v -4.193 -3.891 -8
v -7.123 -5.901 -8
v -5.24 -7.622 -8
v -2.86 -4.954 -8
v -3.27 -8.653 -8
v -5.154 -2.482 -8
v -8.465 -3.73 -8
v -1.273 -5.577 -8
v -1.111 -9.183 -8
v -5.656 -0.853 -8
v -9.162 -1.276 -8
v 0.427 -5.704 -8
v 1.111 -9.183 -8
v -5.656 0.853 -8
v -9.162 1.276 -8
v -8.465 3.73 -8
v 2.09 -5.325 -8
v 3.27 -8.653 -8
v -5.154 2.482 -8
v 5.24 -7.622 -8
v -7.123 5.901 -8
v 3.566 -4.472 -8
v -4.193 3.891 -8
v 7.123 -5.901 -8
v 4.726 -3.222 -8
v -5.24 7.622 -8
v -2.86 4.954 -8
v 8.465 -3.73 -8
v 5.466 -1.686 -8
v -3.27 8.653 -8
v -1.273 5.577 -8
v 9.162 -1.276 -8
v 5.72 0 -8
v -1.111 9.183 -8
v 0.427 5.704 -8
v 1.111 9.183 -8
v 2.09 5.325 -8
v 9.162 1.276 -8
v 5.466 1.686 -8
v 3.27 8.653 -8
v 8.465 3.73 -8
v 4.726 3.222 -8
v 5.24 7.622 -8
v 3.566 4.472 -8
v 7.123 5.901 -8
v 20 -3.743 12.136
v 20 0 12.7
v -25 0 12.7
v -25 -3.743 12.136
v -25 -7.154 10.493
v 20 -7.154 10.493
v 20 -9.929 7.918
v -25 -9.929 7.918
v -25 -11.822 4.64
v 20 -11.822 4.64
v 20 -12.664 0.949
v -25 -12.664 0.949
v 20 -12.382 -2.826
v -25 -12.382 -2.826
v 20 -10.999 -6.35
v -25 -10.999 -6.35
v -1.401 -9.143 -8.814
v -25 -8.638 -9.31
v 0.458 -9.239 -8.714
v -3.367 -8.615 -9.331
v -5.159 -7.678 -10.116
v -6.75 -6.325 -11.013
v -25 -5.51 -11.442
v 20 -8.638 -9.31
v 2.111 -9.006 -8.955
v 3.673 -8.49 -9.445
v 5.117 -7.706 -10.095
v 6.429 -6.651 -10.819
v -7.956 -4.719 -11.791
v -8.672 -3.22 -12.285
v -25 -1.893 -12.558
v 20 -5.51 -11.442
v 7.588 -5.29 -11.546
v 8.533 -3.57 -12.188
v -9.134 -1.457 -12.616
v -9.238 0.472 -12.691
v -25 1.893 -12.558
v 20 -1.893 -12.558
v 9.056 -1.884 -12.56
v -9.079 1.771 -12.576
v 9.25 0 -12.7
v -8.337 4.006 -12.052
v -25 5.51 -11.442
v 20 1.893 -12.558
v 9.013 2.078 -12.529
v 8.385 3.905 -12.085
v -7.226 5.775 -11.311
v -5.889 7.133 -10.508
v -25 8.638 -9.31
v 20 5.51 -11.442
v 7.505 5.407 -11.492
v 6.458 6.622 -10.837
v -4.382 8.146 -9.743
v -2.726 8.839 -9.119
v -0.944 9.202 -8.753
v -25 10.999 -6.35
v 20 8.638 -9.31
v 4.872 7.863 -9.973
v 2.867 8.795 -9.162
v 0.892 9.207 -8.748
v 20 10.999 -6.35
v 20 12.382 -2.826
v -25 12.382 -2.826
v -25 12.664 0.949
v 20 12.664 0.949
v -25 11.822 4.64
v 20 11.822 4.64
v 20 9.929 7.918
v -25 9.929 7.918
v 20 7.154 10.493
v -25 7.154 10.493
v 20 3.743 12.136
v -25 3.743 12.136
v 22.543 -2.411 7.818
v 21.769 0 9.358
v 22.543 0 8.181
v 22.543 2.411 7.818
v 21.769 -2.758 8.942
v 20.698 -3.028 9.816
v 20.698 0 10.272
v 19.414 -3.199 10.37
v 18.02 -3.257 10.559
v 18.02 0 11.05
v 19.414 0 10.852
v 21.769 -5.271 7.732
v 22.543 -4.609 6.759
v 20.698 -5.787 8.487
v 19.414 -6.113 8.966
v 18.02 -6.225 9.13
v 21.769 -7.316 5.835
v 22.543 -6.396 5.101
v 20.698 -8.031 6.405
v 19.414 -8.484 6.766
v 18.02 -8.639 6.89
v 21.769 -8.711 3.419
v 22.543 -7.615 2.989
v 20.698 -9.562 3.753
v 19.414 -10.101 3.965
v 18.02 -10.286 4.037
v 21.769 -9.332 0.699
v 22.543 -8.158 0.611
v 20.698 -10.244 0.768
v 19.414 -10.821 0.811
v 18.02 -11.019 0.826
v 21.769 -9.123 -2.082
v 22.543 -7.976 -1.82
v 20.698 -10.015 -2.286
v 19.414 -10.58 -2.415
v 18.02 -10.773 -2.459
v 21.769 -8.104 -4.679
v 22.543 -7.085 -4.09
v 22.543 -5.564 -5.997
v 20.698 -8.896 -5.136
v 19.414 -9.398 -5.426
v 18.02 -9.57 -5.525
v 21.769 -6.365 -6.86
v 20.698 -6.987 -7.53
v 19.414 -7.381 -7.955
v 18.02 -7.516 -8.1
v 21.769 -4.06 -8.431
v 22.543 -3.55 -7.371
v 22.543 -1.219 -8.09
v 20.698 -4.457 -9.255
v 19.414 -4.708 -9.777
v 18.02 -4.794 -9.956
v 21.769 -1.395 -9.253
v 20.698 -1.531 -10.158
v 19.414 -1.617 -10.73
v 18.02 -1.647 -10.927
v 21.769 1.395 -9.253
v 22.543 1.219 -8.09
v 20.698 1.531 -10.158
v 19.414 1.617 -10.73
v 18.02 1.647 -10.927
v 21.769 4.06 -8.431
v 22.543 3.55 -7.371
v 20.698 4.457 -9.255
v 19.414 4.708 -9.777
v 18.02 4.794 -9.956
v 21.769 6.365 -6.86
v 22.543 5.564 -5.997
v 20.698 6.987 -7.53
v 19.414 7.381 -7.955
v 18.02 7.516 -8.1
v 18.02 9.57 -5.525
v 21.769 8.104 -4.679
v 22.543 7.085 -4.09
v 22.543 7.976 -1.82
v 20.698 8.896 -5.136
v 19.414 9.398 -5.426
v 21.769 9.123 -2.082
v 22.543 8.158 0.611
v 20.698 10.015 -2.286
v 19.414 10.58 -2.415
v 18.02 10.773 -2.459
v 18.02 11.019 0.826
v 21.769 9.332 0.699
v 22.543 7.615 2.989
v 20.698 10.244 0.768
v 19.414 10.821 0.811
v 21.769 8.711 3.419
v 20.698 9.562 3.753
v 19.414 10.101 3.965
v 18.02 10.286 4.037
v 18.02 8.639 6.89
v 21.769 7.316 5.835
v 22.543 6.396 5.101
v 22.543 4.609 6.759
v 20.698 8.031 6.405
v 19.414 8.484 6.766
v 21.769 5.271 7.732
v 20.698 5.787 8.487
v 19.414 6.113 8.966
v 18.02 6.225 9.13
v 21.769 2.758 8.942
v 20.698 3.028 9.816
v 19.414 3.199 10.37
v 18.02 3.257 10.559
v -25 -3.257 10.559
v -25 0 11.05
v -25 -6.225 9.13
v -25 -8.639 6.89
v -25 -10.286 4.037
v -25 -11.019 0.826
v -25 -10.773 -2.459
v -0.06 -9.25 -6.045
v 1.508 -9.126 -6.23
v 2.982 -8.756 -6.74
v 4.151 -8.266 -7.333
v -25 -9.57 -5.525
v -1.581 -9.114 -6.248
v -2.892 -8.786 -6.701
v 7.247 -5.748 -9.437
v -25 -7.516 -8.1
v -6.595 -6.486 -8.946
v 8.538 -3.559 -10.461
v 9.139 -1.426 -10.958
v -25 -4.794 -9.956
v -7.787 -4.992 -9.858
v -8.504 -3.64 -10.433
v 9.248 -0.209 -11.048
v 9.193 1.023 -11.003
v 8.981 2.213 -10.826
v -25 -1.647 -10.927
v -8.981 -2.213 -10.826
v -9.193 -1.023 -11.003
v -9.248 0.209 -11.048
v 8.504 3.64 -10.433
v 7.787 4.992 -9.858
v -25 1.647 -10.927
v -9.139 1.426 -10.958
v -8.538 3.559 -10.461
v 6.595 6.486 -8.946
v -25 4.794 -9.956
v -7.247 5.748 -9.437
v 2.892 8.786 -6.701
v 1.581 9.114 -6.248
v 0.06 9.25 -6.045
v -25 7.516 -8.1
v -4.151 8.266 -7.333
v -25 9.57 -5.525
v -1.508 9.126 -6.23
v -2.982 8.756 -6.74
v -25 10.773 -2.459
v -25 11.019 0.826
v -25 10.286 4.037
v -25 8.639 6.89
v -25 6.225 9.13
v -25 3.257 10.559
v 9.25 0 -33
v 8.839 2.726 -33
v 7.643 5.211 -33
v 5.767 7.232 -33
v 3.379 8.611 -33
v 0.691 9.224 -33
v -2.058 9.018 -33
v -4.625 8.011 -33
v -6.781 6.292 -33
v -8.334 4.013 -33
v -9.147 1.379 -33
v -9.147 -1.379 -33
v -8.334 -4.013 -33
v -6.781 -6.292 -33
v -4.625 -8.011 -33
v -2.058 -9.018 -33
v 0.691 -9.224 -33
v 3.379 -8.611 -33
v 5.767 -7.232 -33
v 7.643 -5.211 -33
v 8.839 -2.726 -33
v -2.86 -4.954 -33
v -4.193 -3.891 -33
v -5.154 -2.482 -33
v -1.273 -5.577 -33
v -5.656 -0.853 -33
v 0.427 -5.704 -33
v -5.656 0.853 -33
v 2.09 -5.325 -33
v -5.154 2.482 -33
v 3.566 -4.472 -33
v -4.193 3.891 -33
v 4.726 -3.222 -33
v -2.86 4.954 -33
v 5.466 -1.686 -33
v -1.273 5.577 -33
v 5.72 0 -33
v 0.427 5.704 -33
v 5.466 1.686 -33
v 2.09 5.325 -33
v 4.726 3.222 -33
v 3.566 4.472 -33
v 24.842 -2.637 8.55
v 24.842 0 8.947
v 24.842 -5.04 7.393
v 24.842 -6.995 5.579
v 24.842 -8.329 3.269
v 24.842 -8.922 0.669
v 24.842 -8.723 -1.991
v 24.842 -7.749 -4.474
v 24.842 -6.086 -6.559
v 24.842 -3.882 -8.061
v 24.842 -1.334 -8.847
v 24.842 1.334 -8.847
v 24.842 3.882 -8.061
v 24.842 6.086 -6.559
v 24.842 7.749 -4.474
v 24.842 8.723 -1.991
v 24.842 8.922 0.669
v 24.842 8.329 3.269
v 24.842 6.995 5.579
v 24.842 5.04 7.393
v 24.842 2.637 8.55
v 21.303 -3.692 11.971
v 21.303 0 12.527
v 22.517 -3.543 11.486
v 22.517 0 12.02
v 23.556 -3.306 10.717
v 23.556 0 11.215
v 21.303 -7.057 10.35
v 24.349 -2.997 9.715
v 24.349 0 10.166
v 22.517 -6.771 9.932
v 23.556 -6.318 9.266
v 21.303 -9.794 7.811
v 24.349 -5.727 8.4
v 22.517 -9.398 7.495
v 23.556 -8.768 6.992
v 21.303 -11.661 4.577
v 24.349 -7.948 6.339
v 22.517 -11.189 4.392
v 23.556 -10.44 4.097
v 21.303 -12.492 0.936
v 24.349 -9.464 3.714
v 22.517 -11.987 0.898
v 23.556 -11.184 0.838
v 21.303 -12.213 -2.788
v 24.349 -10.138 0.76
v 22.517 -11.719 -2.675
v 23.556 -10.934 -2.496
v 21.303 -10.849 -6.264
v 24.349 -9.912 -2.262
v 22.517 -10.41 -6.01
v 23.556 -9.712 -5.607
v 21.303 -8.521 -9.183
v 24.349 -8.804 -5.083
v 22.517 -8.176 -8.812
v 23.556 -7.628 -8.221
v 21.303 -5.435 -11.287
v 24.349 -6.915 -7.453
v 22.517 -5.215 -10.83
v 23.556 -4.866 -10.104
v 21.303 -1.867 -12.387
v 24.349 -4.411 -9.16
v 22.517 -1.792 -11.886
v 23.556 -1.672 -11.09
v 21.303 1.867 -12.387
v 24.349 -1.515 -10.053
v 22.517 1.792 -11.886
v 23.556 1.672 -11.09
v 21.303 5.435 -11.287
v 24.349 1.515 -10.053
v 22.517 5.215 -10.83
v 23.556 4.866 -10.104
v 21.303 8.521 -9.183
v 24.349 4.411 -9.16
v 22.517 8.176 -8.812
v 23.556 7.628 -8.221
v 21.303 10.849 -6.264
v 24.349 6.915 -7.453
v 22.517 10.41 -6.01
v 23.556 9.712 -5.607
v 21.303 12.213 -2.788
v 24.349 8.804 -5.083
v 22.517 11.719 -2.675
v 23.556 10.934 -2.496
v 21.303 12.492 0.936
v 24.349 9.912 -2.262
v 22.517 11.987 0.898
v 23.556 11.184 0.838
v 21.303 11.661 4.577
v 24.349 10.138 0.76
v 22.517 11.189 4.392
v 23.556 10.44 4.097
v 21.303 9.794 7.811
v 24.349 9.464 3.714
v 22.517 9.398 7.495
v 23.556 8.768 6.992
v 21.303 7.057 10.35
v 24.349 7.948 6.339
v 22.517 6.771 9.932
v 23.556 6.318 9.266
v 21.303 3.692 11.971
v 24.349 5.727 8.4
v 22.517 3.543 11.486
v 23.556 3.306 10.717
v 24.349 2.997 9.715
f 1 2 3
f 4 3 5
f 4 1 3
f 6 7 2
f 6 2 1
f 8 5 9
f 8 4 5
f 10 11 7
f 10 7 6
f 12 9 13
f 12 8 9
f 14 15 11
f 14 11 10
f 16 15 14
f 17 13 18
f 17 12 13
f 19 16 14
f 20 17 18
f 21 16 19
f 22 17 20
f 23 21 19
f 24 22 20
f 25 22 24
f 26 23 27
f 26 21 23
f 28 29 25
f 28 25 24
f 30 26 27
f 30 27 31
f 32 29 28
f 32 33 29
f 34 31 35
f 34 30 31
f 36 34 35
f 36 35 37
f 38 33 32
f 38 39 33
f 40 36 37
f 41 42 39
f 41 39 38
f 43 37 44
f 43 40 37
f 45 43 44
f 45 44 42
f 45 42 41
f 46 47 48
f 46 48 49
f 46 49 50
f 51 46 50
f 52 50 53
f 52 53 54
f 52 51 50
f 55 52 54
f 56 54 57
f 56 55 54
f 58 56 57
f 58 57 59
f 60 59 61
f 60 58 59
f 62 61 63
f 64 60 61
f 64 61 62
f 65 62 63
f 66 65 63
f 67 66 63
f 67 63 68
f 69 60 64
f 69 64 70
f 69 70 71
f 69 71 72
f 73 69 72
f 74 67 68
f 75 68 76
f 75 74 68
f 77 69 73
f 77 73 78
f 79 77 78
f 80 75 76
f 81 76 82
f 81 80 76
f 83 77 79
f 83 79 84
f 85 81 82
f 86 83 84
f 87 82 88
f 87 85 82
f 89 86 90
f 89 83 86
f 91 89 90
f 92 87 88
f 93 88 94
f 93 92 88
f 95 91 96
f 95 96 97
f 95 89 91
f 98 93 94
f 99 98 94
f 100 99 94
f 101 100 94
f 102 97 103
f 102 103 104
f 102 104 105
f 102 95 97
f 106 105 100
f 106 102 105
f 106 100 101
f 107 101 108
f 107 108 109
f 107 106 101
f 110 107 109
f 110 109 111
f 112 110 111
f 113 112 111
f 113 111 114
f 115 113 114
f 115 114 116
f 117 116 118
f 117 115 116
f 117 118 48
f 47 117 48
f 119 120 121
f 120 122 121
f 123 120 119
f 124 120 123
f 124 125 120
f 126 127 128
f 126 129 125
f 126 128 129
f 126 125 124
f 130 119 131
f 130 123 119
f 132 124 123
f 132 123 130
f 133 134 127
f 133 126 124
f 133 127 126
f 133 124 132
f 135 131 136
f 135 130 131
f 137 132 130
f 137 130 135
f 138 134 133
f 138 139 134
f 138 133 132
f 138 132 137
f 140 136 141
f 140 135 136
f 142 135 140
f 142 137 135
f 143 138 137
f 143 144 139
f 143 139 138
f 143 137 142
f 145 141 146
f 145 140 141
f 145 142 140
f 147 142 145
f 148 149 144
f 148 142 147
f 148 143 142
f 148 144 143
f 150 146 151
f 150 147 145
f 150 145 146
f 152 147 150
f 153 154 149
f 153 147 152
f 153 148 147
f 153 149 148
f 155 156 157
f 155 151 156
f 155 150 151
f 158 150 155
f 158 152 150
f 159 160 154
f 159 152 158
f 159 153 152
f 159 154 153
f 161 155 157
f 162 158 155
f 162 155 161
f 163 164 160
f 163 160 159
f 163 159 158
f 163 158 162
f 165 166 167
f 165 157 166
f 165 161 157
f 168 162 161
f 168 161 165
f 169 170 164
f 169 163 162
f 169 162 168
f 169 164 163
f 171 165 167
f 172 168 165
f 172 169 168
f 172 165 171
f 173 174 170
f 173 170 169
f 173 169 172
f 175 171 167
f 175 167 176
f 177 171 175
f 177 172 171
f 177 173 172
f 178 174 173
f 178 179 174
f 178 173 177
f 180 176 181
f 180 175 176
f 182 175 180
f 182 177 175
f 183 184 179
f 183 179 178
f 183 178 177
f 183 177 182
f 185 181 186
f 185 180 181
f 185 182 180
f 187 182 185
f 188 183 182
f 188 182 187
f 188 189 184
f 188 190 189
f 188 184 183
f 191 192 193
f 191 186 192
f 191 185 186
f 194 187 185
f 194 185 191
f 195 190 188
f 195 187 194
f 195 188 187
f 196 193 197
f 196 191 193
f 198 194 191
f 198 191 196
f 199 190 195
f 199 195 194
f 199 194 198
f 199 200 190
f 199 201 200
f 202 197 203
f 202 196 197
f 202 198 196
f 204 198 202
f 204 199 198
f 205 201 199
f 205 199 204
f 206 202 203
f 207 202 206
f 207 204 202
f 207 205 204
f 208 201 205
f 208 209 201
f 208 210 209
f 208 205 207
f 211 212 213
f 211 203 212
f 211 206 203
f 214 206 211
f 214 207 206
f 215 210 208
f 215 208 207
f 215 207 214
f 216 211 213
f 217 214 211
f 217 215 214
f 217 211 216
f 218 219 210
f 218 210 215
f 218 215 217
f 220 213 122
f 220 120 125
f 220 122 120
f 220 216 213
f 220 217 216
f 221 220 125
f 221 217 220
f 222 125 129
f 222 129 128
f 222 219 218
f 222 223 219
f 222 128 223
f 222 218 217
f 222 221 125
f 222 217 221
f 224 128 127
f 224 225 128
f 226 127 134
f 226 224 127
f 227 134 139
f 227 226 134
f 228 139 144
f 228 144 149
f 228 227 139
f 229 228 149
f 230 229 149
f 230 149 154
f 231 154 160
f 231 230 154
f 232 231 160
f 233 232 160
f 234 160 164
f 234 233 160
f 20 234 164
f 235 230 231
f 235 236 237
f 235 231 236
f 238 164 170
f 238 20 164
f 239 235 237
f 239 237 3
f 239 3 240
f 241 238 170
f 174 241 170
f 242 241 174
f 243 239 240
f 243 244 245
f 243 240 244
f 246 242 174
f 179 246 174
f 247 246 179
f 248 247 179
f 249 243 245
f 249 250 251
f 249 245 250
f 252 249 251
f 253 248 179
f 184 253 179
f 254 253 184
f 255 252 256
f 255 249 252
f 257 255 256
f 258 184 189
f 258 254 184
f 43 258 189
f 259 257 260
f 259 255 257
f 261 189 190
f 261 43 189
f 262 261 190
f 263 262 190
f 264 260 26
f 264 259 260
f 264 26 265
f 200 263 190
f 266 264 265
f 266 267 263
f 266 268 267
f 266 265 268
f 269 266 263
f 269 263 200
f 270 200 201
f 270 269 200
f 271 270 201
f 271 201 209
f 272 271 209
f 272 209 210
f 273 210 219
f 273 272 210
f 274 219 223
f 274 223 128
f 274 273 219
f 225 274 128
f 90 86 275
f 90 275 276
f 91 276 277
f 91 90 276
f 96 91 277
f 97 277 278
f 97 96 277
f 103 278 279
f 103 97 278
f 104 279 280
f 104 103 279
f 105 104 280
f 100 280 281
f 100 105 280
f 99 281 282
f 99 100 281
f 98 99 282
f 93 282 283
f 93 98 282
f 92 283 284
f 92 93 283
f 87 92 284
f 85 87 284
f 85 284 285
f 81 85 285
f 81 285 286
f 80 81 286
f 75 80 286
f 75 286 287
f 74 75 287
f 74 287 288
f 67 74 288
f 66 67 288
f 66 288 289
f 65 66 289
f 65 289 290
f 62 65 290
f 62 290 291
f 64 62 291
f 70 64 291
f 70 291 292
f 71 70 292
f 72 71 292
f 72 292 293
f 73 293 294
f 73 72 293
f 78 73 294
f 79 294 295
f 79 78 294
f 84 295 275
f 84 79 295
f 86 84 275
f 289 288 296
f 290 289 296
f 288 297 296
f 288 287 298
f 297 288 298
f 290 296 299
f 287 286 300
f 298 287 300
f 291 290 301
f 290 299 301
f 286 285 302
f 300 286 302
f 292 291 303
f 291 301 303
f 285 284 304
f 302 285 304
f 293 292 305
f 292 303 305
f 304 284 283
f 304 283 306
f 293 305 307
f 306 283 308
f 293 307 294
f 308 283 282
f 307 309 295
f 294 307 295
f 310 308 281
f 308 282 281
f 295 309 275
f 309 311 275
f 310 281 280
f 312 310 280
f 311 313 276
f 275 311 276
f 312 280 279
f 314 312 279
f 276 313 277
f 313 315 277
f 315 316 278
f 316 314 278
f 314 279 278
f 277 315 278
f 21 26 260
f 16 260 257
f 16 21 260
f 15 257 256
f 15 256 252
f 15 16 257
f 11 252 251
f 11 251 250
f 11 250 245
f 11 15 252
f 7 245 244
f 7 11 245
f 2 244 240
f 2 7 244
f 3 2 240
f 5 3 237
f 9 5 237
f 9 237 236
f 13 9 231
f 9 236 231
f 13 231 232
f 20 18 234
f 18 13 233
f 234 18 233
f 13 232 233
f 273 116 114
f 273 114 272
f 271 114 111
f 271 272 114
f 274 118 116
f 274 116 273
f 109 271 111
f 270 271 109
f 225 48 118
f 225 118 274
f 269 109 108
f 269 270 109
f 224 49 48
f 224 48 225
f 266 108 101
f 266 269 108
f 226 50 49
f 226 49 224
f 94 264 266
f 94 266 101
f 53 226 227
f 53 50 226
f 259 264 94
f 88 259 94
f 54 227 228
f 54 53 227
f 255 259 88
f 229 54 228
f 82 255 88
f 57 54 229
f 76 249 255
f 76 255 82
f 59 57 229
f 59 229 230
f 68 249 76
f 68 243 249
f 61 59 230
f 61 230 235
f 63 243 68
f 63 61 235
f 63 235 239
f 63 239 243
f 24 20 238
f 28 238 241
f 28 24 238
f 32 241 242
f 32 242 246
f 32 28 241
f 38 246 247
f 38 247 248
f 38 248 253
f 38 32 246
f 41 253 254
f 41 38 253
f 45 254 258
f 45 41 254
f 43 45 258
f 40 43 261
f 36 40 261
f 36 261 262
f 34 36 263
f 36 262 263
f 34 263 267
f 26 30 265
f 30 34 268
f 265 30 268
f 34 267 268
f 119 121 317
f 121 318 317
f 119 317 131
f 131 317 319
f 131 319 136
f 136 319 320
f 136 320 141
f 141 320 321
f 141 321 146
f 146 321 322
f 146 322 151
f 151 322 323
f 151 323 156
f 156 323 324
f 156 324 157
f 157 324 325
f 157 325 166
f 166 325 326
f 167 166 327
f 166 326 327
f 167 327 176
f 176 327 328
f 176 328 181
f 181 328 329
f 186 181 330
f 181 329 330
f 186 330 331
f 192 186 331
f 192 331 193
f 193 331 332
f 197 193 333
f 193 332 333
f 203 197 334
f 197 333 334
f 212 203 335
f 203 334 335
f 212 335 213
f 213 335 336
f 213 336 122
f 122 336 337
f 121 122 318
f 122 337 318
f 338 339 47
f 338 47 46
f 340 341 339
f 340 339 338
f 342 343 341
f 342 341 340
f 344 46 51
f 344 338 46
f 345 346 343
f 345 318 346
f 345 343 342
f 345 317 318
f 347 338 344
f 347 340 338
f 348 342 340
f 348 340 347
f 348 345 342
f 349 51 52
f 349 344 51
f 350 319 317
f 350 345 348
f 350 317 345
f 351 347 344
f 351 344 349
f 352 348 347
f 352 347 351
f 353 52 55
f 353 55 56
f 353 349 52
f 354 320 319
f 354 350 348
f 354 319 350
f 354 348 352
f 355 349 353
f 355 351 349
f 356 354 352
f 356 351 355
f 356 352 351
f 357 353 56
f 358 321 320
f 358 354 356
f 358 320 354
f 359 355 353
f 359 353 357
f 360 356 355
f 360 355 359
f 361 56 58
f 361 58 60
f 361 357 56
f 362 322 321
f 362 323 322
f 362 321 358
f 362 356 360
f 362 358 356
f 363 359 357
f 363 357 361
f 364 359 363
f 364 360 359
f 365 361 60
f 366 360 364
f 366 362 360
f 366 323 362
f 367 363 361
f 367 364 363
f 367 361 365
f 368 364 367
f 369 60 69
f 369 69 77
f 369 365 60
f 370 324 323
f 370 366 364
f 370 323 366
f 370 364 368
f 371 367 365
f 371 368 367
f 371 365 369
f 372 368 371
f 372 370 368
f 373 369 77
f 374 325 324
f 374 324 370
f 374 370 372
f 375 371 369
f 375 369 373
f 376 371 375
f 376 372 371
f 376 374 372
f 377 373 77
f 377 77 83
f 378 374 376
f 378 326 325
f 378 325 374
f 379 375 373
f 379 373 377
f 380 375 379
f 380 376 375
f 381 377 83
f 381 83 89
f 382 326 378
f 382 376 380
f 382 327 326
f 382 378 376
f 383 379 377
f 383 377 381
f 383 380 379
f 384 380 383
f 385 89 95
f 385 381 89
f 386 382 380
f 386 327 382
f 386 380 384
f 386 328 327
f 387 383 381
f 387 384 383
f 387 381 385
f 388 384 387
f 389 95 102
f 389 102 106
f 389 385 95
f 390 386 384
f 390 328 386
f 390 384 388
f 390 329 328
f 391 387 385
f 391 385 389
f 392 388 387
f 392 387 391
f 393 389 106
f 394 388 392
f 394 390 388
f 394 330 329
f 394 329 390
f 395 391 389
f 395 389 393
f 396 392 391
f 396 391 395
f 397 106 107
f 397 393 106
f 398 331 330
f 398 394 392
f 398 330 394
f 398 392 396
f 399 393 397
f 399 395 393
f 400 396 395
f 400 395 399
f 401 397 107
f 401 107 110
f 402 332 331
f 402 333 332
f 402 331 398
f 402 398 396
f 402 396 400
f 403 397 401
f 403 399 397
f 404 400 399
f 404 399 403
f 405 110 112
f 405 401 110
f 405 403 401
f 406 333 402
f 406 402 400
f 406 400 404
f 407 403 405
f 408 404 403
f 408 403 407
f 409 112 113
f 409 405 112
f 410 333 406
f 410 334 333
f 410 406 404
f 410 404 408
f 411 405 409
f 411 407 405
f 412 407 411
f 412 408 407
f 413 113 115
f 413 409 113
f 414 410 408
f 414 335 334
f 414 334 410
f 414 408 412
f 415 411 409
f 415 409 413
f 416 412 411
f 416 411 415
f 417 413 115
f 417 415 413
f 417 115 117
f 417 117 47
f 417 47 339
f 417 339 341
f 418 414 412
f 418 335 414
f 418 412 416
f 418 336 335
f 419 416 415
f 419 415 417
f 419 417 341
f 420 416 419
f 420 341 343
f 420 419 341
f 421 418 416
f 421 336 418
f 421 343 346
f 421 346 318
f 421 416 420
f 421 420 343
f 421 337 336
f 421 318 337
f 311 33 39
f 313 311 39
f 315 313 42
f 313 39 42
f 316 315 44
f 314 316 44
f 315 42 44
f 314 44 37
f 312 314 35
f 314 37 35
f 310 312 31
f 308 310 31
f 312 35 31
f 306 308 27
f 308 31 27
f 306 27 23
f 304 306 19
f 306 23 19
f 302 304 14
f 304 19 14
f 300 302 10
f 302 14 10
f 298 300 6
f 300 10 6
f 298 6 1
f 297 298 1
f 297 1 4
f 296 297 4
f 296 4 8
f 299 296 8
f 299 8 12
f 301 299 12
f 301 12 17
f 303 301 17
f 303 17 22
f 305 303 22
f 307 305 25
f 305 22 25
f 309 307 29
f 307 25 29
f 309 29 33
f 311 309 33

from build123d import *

# Parameters (mm, degrees)
SKIZZE3_R                       = 9.25
SCHNITT_LINEAR_AUSTRAGEN1_DEPTH = 30
SKIZZE5_R                       = 9.25
SKIZZE5_R_2                     = 5.72
AUFSATZ_LINEAR_AUSTRAGEN1_DEPTH = 25


with BuildPart() as part:
    # Skizze1 → Rotation1 (revolve)
    with BuildSketch(Plane.XY):
        with BuildLine():
            Line((-25, 12.7), (20, 12.7))
            ThreePointArc((20, 12.7), (23.535533906, 11.235533906), (25, 7.7))
            Line((25, 7.7), (25, 0))
            Line((25, 0), (23.01981108, 0))
            Line((23.01981108, 0), (23.01981108, 6.05))
            ThreePointArc((23.01981108, 6.05), (21.555344986, 9.585533906), (18.01981108, 11.05))
            Line((18.01981108, 11.05), (-25, 11.05))
            Line((-25, 11.05), (-25, 12.7))
        make_face()
    revolve(axis=Axis((-16.35087822, 0, 0), (1, 0, 0)))

    # Skizze2 → Schnitt-Rotation1 (revolve, cut)
    with BuildSketch(Plane(origin=(0, 0, 0), x_dir=(1, 0, 0), z_dir=(0, 1, 0))):
        Polygon((22, 0), (22, 8), (25, 9), (25, 0), align=None)
    revolve(axis=Axis((-29.523851761, 0, 0), (1, 0, 0)), mode=Mode.SUBTRACT)

    # Skizze3 → Schnitt-Linear austragen1 (cut)
    with BuildSketch(Plane.XY):
        Circle(SKIZZE3_R)
    extrude(amount=-SCHNITT_LINEAR_AUSTRAGEN1_DEPTH, mode=Mode.SUBTRACT)

    # Skizze5 → Aufsatz-Linear austragen1 (add)
    with BuildSketch(Plane.XY.offset(-8)):
        Circle(SKIZZE5_R)
        Circle(SKIZZE5_R_2, mode=Mode.SUBTRACT)
    extrude(amount=-AUFSATZ_LINEAR_AUSTRAGEN1_DEPTH)


solid = part.part
